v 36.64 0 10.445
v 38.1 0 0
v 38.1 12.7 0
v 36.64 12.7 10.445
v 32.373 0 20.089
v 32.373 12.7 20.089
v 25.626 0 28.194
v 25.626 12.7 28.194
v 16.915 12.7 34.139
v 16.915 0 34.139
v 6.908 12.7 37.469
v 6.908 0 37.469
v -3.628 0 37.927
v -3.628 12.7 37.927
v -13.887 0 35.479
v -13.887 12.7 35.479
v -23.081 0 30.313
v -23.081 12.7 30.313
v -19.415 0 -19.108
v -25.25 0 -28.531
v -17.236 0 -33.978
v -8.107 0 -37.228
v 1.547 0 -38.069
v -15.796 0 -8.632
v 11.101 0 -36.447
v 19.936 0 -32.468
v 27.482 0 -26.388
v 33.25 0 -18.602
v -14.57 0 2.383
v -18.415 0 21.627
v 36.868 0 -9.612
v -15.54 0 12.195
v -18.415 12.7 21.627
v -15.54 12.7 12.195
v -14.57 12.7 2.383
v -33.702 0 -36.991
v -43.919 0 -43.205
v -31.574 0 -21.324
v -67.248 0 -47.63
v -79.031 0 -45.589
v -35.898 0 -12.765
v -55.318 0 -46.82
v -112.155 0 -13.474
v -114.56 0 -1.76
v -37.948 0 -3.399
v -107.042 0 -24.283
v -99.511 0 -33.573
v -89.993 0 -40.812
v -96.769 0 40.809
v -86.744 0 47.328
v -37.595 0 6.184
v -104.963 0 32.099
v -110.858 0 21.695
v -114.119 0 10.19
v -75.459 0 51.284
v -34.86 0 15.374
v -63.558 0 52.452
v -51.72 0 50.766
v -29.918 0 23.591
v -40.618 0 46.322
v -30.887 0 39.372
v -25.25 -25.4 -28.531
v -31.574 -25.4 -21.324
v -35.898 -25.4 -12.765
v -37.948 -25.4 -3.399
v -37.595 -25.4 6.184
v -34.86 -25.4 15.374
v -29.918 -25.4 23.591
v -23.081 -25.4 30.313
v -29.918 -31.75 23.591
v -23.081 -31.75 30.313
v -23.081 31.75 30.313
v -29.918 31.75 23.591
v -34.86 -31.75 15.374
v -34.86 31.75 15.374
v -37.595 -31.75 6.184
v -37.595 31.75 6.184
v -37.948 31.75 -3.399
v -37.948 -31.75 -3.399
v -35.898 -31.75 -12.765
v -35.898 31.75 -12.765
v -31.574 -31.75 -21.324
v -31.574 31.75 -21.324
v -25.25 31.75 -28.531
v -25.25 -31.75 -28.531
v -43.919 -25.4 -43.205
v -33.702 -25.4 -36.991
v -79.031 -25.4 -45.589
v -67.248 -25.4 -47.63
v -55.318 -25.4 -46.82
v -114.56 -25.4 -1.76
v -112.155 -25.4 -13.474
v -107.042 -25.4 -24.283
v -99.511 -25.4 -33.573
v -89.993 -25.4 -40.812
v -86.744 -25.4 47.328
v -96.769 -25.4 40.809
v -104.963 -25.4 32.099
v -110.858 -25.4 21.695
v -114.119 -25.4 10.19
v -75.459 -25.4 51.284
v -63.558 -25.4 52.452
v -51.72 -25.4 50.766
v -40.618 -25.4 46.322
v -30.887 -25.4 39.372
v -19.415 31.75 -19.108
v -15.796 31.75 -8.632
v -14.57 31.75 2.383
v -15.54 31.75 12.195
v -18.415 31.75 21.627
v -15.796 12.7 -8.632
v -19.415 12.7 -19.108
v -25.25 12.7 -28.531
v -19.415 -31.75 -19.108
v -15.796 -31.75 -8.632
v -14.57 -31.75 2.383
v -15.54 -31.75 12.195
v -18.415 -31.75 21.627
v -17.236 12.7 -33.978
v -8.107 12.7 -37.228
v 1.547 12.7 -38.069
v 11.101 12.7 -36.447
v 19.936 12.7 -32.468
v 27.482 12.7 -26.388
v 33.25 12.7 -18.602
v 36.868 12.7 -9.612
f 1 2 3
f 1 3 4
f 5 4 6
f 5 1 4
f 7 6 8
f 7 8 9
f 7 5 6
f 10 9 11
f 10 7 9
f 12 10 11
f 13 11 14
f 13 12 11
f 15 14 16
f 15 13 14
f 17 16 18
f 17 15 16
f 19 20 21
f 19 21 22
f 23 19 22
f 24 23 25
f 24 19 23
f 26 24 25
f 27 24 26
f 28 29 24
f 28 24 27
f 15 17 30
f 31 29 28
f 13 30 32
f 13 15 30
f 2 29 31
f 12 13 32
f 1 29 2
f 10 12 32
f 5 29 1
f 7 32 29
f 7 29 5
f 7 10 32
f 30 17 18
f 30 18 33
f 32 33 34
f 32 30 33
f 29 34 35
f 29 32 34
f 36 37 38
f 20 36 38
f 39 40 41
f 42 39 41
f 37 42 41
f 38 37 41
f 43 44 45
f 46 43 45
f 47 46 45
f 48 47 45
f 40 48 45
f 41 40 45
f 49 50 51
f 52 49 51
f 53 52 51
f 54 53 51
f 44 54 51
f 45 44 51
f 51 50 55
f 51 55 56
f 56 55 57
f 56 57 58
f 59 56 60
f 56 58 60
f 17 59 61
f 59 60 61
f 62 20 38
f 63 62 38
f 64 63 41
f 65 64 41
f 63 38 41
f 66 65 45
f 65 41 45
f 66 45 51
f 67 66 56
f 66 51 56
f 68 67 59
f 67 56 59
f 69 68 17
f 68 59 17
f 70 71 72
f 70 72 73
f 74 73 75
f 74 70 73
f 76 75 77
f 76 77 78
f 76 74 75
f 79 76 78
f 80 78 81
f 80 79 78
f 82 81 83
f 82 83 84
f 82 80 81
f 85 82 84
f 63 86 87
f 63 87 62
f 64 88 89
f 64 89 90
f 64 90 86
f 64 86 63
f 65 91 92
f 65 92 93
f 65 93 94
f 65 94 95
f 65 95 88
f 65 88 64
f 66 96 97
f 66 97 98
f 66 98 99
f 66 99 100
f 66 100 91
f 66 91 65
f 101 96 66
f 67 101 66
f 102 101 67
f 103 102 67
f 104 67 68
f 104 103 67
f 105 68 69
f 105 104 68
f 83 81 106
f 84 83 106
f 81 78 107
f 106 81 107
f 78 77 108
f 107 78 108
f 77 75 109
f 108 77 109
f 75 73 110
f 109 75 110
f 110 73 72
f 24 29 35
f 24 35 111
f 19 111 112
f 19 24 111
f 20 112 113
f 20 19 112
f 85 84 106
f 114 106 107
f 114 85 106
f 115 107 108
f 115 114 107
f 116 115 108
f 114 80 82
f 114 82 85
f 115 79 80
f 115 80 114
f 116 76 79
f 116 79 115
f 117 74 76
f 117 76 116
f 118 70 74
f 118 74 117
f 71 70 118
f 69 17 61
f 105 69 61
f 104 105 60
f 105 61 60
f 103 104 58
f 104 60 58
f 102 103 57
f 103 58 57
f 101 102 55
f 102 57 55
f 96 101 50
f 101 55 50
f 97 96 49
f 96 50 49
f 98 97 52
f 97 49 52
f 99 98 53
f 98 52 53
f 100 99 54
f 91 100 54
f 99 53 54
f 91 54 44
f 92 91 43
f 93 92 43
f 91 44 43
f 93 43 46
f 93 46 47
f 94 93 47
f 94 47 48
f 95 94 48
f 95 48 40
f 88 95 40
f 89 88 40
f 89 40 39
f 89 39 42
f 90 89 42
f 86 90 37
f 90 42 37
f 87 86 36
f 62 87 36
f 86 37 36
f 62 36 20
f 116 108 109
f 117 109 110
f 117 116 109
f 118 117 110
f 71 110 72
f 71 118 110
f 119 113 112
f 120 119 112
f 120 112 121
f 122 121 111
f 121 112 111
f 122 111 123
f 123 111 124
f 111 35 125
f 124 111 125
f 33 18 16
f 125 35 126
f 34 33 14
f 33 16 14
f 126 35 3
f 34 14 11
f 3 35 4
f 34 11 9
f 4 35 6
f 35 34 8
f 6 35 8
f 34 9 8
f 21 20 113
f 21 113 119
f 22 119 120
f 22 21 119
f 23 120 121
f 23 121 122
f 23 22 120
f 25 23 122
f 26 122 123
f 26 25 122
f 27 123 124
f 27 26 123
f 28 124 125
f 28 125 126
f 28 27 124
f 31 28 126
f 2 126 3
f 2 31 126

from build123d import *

# Parameters (mm, degrees)
F1_DEPTH = 25.4
F2_DEPTH = 12.7
F3_DEPTH = 31.75


with BuildPart() as f1:
    # F0 (on Front) → F1 (new body)
    with BuildSketch(Plane.XZ):
        with BuildLine():
            ThreePointArc((-25.250333, -28.531223), (-38.074135, 1.403656), (-23.080958, 30.313023))
            ThreePointArc((-23.080958, 30.313023), (-114.697565, 4.228486), (-25.250333, -28.531223))
        make_face()
    extrude(amount=F1_DEPTH)


with BuildPart() as f2:
    # F0 (on Front) → F2 (new body)
    with BuildSketch(Plane.XZ):
        with BuildLine():
            ThreePointArc((-25.250333, -28.531223), (15.645643, -34.73937), (38.1, 0))
            ThreePointArc((38.1, 0), (16.914868, 34.13938), (-23.080958, 30.313023))
            ThreePointArc((-23.080958, 30.313023), (-16.744747, 16.982266), (-14.569701, 2.383436))
            ThreePointArc((-14.569701, 2.383436), (-17.31511, -13.970402), (-25.250333, -28.531223))
        make_face()
    extrude(amount=-F2_DEPTH)


with BuildPart() as f3:
    # F0 (on Front) → F3 (new body, symmetric)
    with BuildSketch(Plane.XZ):
        with BuildLine():
            ThreePointArc((-14.569701, 2.383436), (-16.744747, 16.982266), (-23.080958, 30.313023))
            ThreePointArc((-23.080958, 30.313023), (-38.074135, 1.403656), (-25.250333, -28.531223))
            ThreePointArc((-25.250333, -28.531223), (-17.31511, -13.970402), (-14.569701, 2.383436))
        make_face()
    extrude(amount=F3_DEPTH, both=True)


solid = Compound([f1.part, f2.part, f3.part])
